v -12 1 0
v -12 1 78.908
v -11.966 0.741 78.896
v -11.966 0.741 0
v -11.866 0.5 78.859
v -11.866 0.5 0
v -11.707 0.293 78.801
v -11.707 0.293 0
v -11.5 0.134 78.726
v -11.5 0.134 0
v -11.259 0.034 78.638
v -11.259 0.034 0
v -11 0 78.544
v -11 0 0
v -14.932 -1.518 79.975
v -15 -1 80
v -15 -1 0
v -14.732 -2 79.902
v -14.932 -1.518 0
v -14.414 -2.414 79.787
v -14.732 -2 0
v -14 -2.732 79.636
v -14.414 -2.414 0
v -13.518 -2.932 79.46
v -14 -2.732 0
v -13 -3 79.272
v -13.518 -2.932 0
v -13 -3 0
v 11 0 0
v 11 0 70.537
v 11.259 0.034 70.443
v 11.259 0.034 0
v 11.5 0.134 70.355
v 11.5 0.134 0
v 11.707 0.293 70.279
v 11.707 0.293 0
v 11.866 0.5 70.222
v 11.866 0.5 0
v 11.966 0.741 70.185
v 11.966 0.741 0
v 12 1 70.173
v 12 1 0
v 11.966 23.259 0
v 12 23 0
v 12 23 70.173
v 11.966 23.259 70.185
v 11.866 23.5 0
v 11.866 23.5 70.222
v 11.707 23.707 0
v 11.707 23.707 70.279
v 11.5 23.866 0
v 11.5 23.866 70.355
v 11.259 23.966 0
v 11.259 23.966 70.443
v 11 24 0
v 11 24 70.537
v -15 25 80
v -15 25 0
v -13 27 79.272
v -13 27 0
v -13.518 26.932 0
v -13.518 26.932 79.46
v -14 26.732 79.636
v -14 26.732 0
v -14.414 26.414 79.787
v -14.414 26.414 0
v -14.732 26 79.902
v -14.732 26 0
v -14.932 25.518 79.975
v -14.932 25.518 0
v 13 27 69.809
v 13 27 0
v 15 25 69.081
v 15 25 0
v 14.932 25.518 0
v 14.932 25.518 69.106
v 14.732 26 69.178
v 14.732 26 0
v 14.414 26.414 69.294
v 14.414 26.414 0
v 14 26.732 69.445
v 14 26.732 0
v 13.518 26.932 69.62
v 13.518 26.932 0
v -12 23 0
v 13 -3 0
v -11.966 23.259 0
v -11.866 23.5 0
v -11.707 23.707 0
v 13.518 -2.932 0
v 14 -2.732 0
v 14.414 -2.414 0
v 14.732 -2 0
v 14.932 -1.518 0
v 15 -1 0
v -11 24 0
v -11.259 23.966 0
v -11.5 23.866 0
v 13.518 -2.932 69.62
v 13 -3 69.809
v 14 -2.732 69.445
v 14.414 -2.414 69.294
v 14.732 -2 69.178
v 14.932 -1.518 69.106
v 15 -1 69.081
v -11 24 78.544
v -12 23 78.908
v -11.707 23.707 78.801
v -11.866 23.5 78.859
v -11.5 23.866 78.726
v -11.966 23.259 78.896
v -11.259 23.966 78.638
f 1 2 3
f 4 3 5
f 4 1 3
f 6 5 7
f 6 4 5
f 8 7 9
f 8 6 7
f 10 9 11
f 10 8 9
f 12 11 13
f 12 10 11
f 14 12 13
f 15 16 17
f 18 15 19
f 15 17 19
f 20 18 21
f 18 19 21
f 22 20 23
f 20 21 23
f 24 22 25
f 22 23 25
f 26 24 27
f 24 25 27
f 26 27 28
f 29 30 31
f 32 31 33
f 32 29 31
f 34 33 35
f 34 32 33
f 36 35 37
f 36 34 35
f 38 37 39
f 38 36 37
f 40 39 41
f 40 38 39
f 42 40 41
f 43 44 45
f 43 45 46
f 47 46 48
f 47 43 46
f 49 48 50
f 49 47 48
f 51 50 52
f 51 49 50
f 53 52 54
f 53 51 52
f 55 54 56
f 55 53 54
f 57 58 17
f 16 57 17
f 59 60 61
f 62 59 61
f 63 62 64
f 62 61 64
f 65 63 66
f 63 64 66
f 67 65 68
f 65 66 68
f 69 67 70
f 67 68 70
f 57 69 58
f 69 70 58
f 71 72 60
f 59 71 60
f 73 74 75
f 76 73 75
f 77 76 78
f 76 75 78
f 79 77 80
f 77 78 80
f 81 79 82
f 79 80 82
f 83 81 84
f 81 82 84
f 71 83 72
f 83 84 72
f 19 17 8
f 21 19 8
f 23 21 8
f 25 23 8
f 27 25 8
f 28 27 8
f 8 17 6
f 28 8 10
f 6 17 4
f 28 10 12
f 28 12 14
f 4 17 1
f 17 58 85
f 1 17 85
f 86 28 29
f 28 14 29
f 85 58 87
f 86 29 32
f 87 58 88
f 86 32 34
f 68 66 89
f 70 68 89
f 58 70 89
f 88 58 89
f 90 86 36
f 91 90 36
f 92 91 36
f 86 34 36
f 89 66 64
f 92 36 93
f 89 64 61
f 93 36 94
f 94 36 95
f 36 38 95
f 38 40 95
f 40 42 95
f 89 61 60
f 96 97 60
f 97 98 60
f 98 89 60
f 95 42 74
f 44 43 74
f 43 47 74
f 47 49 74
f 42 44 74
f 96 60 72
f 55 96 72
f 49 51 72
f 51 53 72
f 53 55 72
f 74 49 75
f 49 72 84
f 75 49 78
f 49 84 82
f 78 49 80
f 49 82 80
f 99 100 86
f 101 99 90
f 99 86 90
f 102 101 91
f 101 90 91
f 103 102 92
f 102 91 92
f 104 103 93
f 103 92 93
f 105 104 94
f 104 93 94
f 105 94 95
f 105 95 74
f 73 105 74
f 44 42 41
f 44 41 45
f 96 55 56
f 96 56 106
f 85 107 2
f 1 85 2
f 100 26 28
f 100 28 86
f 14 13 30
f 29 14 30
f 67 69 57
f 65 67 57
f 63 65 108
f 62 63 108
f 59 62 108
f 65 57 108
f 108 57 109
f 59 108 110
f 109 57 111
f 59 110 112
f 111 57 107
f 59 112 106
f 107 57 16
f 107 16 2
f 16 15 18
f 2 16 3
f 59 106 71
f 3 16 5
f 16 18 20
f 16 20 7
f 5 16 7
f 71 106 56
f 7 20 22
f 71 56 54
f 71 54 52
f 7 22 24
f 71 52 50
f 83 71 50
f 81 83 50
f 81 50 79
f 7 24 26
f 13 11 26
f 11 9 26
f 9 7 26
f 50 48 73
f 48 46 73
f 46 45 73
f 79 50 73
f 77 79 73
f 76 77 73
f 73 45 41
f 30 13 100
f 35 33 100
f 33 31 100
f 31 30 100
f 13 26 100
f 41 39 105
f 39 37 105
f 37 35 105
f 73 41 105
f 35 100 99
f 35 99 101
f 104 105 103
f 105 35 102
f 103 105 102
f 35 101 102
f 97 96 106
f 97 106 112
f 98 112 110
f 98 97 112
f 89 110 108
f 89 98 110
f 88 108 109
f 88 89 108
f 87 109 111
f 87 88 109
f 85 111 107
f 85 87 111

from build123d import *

# Parameters (mm, degrees)
DODANIE_WYCI_GNI_CIE1_DEPTH = 80
WYTNIJ_WYCI_GNI_CIE1_DEPTH  = 70


with BuildPart() as part:
    # Szkic1 → Dodanie-wyciągnięcie1 (new body)
    with BuildSketch(Plane.XY):
        with BuildLine():
            Line((-13, -3), (13, -3))
            ThreePointArc((13, -3), (14.414213562, -2.414213562), (15, -1))
            Line((15, -1), (15, 25))
            ThreePointArc((15, 25), (14.414213562, 26.414213562), (13, 27))
            Line((13, 27), (-13, 27))
            ThreePointArc((-13, 27), (-14.414213562, 26.414213562), (-15, 25))
            Line((-15, 25), (-15, -1))
            ThreePointArc((-15, -1), (-14.414213562, -2.414213562), (-13, -3))
        make_face()
        with BuildLine():
            Line((-11, 0), (11, 0))
            ThreePointArc((11, 0), (11.707106781, 0.292893219), (12, 1))
            Line((12, 1), (12, 23))
            ThreePointArc((12, 23), (11.707106781, 23.707106781), (11, 24))
            Line((11, 24), (-11, 24))
            ThreePointArc((-11, 24), (-11.707106781, 23.707106781), (-12, 23))
            Line((-12, 23), (-12, 1))
            ThreePointArc((-12, 1), (-11.707106781, 0.292893219), (-11, 0))
        make_face(mode=Mode.SUBTRACT)
    extrude(amount=DODANIE_WYCI_GNI_CIE1_DEPTH)

    # Szkic2 → Wytnij-wyciągnięcie1 (cut)
    with BuildSketch(Plane.XZ.offset(3)):
        Polygon((-15, 80), (63.522310859, 51.420216122), (63.522310859, 80), align=None)
    extrude(amount=-WYTNIJ_WYCI_GNI_CIE1_DEPTH, mode=Mode.SUBTRACT)


solid = part.part
